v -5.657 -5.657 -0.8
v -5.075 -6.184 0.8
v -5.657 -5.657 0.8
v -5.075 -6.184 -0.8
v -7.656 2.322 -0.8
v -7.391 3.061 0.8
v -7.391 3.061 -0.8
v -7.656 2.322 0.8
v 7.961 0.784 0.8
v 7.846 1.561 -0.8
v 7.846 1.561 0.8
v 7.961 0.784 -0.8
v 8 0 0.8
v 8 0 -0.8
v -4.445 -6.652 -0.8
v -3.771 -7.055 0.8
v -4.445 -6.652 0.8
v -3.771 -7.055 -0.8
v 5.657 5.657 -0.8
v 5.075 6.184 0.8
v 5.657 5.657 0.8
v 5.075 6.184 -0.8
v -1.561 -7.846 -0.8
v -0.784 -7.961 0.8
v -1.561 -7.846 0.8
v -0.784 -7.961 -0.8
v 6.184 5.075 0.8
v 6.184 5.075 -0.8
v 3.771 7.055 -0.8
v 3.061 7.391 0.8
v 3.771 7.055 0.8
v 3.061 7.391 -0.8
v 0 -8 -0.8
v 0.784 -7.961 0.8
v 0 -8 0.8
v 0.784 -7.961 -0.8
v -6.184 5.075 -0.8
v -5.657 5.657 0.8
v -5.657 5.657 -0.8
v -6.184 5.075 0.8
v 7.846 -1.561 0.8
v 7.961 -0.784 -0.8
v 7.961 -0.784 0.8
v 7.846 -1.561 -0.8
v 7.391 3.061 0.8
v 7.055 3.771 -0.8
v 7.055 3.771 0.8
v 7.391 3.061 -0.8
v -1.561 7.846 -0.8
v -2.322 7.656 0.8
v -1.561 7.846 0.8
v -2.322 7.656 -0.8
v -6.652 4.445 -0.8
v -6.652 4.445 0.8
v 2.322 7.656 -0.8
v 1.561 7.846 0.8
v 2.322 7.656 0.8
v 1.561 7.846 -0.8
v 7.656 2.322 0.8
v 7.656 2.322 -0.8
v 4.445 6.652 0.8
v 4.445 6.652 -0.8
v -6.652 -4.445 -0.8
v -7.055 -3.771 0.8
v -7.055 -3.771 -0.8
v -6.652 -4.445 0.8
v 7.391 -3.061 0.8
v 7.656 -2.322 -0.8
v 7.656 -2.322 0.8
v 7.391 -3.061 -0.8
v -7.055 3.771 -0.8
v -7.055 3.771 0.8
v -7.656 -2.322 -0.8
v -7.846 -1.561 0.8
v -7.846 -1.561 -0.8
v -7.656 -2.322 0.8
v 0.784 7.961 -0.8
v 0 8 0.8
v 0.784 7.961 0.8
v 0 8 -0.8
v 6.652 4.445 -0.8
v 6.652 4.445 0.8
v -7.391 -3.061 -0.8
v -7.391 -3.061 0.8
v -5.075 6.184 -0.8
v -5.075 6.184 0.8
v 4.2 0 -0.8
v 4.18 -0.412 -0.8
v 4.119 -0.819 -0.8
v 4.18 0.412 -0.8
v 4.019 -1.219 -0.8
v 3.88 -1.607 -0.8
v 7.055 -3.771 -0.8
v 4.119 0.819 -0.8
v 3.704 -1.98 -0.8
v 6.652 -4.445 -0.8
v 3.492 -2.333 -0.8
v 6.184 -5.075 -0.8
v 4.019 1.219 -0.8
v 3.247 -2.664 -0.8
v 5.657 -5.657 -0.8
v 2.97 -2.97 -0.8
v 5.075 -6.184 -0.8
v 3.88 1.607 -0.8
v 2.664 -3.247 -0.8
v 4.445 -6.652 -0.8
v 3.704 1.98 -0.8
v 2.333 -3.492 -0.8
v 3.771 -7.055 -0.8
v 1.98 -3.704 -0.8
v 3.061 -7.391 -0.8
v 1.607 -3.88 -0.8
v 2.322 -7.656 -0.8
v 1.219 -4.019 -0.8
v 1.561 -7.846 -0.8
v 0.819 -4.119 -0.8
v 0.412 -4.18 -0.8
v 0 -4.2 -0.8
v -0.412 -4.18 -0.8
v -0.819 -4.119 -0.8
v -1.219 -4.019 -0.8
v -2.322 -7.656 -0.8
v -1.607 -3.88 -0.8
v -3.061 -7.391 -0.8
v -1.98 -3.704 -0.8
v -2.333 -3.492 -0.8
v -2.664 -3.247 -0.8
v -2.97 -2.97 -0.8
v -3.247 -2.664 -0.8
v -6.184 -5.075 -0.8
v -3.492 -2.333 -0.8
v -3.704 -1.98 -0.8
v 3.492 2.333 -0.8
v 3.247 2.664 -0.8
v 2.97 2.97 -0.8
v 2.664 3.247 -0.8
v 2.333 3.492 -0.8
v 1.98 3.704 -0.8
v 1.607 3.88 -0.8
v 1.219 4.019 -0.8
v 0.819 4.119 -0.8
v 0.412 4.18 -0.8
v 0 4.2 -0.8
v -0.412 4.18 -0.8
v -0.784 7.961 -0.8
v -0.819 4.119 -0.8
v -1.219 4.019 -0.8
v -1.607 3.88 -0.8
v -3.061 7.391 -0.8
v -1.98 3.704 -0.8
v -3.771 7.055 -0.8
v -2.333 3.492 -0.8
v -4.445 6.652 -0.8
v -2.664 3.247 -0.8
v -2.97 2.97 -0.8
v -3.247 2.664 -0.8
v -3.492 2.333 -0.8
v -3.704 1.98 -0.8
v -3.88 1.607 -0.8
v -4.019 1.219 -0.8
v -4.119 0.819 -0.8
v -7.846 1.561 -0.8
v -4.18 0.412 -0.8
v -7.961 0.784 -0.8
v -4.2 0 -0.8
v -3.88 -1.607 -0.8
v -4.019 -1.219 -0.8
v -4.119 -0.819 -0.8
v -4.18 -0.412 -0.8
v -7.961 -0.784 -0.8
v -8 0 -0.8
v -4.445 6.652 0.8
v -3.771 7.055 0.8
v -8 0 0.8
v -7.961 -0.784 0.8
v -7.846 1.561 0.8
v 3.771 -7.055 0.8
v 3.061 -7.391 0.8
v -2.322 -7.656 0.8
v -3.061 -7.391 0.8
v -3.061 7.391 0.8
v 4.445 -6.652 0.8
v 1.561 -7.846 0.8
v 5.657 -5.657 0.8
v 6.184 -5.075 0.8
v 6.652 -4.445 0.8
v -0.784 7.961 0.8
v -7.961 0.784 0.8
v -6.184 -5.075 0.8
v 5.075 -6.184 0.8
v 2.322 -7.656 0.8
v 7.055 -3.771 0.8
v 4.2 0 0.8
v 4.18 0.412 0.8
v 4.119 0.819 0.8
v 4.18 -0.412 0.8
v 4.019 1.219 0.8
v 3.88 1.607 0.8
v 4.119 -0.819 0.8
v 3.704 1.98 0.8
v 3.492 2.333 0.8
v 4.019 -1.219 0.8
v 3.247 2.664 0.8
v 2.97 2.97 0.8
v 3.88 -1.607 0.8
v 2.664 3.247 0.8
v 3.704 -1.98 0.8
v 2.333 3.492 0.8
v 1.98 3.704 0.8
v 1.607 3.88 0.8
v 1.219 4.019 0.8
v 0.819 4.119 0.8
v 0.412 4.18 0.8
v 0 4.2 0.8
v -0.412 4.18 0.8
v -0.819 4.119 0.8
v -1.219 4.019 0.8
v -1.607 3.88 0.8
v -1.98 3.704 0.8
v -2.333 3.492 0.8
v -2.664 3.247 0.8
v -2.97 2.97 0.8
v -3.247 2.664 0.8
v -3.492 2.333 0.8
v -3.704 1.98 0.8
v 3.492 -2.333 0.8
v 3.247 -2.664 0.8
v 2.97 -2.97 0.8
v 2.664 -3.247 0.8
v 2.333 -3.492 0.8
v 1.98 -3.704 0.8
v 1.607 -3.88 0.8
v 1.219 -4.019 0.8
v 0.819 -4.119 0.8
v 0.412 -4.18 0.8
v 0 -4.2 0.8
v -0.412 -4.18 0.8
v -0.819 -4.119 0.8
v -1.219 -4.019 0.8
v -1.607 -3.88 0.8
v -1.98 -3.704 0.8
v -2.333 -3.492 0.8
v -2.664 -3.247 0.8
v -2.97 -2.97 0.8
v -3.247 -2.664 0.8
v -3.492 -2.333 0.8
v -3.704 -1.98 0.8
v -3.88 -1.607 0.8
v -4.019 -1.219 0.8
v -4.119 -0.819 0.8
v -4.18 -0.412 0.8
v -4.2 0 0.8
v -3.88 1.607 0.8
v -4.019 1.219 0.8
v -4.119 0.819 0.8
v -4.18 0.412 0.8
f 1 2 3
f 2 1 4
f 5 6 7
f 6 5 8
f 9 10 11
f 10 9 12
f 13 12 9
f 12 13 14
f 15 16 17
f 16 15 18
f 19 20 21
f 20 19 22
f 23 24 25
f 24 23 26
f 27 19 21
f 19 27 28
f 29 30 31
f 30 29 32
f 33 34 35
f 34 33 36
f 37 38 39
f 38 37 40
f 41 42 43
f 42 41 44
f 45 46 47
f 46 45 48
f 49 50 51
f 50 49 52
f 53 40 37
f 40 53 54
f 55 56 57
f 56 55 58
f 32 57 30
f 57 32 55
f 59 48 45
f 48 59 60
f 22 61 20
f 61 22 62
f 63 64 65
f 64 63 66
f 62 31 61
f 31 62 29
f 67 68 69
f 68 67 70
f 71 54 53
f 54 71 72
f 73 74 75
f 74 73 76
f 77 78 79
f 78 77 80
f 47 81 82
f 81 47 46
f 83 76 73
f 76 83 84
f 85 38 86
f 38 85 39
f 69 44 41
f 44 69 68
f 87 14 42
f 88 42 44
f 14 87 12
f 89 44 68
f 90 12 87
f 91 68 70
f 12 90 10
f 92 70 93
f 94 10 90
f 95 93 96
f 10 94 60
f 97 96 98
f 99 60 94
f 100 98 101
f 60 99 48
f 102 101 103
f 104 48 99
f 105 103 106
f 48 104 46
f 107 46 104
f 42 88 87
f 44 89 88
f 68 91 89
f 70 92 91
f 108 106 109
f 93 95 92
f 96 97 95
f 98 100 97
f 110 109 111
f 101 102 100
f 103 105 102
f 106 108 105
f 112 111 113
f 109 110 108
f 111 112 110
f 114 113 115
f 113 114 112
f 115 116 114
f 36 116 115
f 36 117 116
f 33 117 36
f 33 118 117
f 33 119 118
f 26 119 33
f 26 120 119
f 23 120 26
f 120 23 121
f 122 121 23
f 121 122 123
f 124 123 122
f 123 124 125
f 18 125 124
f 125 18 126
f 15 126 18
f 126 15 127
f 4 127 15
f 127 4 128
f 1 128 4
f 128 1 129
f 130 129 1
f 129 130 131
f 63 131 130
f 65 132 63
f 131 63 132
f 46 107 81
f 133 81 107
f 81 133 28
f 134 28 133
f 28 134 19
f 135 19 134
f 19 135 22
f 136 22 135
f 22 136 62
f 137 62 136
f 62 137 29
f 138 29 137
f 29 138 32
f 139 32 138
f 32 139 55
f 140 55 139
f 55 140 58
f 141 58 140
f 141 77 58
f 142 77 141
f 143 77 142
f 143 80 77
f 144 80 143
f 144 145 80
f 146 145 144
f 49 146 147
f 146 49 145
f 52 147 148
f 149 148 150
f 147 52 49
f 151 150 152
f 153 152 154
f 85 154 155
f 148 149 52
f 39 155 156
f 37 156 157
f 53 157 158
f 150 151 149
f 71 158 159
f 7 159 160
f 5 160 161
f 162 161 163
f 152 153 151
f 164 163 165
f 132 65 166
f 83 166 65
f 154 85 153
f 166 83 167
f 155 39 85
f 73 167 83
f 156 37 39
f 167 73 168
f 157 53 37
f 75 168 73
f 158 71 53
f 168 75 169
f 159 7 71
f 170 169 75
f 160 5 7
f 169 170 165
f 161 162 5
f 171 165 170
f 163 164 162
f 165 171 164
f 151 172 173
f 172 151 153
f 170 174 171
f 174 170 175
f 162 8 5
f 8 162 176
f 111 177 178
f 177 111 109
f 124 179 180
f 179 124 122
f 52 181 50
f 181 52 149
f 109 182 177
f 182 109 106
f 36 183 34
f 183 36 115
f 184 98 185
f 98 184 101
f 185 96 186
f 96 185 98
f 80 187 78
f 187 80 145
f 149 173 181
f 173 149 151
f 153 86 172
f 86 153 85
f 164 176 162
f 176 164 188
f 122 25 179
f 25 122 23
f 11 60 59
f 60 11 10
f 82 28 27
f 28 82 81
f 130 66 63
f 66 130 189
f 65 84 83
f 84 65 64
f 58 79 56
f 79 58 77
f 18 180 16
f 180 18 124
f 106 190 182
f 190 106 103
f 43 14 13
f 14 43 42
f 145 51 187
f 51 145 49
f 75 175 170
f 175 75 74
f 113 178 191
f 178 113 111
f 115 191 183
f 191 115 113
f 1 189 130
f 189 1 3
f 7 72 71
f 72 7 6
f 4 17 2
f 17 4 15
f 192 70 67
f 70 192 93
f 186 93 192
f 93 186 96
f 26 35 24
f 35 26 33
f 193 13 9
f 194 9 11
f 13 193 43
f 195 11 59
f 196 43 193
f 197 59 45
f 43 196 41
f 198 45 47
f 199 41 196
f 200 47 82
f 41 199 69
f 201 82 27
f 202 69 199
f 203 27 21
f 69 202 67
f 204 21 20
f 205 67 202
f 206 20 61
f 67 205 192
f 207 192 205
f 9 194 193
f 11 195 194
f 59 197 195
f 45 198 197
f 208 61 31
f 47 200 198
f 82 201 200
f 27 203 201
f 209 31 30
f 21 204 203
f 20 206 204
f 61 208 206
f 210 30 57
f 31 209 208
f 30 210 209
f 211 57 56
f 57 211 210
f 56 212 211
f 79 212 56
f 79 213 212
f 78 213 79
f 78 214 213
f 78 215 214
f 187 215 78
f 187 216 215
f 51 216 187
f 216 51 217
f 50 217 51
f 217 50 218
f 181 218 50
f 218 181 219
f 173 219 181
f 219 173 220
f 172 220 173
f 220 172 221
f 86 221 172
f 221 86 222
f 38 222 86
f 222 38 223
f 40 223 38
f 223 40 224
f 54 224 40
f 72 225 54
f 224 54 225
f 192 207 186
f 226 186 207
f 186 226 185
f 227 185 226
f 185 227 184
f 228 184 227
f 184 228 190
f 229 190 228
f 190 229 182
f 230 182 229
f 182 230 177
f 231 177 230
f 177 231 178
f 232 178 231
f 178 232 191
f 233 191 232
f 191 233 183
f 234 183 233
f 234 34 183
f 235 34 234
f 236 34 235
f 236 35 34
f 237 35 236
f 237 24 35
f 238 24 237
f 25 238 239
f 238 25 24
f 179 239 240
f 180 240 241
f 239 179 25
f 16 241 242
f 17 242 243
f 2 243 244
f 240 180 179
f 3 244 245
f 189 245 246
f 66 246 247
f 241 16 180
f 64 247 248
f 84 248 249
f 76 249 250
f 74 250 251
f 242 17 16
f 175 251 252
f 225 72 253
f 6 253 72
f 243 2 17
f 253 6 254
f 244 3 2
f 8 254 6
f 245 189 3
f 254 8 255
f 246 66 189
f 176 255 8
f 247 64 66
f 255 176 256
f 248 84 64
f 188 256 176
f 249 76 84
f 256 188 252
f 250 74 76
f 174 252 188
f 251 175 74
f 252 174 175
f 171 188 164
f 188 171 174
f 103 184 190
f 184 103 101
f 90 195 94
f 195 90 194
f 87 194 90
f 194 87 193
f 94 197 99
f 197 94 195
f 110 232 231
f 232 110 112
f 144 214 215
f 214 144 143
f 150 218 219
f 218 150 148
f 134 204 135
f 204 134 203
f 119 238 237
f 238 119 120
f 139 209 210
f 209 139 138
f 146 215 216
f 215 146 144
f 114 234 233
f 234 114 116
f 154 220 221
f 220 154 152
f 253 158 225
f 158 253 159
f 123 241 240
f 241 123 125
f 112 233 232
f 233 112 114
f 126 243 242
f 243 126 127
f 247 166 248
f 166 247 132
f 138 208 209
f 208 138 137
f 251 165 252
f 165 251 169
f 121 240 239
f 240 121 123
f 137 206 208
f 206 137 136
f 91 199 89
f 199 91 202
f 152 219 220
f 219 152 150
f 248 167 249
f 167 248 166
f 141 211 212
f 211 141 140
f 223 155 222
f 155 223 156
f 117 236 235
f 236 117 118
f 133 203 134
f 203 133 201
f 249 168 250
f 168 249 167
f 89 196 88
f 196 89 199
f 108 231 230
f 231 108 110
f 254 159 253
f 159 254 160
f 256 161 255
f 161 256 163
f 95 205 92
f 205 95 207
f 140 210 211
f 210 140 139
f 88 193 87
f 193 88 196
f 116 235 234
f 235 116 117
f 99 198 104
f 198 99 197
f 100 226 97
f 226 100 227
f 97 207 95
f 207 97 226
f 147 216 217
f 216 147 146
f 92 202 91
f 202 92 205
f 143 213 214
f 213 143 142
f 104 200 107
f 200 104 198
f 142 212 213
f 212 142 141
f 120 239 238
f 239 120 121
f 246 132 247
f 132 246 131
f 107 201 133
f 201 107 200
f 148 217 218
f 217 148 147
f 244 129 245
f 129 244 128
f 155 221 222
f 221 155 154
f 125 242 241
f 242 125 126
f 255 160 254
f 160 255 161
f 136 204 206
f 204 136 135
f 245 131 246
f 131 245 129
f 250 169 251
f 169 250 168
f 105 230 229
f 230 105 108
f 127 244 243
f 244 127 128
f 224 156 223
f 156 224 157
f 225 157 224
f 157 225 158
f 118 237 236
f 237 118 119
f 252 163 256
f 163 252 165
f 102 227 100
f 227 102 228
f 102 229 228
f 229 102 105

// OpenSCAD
// M8 Flat Washer
// OD=16mm, ID=8.4mm, H=1.6mm
washer_od = 16;
washer_id = 8.4;
washer_h = 1.6;

difference() {
    cylinder(d=washer_od, h=washer_h, center=true, $fn=64);
    cylinder(d=washer_id, h=washer_h+1, center=true, $fn=64);
}
